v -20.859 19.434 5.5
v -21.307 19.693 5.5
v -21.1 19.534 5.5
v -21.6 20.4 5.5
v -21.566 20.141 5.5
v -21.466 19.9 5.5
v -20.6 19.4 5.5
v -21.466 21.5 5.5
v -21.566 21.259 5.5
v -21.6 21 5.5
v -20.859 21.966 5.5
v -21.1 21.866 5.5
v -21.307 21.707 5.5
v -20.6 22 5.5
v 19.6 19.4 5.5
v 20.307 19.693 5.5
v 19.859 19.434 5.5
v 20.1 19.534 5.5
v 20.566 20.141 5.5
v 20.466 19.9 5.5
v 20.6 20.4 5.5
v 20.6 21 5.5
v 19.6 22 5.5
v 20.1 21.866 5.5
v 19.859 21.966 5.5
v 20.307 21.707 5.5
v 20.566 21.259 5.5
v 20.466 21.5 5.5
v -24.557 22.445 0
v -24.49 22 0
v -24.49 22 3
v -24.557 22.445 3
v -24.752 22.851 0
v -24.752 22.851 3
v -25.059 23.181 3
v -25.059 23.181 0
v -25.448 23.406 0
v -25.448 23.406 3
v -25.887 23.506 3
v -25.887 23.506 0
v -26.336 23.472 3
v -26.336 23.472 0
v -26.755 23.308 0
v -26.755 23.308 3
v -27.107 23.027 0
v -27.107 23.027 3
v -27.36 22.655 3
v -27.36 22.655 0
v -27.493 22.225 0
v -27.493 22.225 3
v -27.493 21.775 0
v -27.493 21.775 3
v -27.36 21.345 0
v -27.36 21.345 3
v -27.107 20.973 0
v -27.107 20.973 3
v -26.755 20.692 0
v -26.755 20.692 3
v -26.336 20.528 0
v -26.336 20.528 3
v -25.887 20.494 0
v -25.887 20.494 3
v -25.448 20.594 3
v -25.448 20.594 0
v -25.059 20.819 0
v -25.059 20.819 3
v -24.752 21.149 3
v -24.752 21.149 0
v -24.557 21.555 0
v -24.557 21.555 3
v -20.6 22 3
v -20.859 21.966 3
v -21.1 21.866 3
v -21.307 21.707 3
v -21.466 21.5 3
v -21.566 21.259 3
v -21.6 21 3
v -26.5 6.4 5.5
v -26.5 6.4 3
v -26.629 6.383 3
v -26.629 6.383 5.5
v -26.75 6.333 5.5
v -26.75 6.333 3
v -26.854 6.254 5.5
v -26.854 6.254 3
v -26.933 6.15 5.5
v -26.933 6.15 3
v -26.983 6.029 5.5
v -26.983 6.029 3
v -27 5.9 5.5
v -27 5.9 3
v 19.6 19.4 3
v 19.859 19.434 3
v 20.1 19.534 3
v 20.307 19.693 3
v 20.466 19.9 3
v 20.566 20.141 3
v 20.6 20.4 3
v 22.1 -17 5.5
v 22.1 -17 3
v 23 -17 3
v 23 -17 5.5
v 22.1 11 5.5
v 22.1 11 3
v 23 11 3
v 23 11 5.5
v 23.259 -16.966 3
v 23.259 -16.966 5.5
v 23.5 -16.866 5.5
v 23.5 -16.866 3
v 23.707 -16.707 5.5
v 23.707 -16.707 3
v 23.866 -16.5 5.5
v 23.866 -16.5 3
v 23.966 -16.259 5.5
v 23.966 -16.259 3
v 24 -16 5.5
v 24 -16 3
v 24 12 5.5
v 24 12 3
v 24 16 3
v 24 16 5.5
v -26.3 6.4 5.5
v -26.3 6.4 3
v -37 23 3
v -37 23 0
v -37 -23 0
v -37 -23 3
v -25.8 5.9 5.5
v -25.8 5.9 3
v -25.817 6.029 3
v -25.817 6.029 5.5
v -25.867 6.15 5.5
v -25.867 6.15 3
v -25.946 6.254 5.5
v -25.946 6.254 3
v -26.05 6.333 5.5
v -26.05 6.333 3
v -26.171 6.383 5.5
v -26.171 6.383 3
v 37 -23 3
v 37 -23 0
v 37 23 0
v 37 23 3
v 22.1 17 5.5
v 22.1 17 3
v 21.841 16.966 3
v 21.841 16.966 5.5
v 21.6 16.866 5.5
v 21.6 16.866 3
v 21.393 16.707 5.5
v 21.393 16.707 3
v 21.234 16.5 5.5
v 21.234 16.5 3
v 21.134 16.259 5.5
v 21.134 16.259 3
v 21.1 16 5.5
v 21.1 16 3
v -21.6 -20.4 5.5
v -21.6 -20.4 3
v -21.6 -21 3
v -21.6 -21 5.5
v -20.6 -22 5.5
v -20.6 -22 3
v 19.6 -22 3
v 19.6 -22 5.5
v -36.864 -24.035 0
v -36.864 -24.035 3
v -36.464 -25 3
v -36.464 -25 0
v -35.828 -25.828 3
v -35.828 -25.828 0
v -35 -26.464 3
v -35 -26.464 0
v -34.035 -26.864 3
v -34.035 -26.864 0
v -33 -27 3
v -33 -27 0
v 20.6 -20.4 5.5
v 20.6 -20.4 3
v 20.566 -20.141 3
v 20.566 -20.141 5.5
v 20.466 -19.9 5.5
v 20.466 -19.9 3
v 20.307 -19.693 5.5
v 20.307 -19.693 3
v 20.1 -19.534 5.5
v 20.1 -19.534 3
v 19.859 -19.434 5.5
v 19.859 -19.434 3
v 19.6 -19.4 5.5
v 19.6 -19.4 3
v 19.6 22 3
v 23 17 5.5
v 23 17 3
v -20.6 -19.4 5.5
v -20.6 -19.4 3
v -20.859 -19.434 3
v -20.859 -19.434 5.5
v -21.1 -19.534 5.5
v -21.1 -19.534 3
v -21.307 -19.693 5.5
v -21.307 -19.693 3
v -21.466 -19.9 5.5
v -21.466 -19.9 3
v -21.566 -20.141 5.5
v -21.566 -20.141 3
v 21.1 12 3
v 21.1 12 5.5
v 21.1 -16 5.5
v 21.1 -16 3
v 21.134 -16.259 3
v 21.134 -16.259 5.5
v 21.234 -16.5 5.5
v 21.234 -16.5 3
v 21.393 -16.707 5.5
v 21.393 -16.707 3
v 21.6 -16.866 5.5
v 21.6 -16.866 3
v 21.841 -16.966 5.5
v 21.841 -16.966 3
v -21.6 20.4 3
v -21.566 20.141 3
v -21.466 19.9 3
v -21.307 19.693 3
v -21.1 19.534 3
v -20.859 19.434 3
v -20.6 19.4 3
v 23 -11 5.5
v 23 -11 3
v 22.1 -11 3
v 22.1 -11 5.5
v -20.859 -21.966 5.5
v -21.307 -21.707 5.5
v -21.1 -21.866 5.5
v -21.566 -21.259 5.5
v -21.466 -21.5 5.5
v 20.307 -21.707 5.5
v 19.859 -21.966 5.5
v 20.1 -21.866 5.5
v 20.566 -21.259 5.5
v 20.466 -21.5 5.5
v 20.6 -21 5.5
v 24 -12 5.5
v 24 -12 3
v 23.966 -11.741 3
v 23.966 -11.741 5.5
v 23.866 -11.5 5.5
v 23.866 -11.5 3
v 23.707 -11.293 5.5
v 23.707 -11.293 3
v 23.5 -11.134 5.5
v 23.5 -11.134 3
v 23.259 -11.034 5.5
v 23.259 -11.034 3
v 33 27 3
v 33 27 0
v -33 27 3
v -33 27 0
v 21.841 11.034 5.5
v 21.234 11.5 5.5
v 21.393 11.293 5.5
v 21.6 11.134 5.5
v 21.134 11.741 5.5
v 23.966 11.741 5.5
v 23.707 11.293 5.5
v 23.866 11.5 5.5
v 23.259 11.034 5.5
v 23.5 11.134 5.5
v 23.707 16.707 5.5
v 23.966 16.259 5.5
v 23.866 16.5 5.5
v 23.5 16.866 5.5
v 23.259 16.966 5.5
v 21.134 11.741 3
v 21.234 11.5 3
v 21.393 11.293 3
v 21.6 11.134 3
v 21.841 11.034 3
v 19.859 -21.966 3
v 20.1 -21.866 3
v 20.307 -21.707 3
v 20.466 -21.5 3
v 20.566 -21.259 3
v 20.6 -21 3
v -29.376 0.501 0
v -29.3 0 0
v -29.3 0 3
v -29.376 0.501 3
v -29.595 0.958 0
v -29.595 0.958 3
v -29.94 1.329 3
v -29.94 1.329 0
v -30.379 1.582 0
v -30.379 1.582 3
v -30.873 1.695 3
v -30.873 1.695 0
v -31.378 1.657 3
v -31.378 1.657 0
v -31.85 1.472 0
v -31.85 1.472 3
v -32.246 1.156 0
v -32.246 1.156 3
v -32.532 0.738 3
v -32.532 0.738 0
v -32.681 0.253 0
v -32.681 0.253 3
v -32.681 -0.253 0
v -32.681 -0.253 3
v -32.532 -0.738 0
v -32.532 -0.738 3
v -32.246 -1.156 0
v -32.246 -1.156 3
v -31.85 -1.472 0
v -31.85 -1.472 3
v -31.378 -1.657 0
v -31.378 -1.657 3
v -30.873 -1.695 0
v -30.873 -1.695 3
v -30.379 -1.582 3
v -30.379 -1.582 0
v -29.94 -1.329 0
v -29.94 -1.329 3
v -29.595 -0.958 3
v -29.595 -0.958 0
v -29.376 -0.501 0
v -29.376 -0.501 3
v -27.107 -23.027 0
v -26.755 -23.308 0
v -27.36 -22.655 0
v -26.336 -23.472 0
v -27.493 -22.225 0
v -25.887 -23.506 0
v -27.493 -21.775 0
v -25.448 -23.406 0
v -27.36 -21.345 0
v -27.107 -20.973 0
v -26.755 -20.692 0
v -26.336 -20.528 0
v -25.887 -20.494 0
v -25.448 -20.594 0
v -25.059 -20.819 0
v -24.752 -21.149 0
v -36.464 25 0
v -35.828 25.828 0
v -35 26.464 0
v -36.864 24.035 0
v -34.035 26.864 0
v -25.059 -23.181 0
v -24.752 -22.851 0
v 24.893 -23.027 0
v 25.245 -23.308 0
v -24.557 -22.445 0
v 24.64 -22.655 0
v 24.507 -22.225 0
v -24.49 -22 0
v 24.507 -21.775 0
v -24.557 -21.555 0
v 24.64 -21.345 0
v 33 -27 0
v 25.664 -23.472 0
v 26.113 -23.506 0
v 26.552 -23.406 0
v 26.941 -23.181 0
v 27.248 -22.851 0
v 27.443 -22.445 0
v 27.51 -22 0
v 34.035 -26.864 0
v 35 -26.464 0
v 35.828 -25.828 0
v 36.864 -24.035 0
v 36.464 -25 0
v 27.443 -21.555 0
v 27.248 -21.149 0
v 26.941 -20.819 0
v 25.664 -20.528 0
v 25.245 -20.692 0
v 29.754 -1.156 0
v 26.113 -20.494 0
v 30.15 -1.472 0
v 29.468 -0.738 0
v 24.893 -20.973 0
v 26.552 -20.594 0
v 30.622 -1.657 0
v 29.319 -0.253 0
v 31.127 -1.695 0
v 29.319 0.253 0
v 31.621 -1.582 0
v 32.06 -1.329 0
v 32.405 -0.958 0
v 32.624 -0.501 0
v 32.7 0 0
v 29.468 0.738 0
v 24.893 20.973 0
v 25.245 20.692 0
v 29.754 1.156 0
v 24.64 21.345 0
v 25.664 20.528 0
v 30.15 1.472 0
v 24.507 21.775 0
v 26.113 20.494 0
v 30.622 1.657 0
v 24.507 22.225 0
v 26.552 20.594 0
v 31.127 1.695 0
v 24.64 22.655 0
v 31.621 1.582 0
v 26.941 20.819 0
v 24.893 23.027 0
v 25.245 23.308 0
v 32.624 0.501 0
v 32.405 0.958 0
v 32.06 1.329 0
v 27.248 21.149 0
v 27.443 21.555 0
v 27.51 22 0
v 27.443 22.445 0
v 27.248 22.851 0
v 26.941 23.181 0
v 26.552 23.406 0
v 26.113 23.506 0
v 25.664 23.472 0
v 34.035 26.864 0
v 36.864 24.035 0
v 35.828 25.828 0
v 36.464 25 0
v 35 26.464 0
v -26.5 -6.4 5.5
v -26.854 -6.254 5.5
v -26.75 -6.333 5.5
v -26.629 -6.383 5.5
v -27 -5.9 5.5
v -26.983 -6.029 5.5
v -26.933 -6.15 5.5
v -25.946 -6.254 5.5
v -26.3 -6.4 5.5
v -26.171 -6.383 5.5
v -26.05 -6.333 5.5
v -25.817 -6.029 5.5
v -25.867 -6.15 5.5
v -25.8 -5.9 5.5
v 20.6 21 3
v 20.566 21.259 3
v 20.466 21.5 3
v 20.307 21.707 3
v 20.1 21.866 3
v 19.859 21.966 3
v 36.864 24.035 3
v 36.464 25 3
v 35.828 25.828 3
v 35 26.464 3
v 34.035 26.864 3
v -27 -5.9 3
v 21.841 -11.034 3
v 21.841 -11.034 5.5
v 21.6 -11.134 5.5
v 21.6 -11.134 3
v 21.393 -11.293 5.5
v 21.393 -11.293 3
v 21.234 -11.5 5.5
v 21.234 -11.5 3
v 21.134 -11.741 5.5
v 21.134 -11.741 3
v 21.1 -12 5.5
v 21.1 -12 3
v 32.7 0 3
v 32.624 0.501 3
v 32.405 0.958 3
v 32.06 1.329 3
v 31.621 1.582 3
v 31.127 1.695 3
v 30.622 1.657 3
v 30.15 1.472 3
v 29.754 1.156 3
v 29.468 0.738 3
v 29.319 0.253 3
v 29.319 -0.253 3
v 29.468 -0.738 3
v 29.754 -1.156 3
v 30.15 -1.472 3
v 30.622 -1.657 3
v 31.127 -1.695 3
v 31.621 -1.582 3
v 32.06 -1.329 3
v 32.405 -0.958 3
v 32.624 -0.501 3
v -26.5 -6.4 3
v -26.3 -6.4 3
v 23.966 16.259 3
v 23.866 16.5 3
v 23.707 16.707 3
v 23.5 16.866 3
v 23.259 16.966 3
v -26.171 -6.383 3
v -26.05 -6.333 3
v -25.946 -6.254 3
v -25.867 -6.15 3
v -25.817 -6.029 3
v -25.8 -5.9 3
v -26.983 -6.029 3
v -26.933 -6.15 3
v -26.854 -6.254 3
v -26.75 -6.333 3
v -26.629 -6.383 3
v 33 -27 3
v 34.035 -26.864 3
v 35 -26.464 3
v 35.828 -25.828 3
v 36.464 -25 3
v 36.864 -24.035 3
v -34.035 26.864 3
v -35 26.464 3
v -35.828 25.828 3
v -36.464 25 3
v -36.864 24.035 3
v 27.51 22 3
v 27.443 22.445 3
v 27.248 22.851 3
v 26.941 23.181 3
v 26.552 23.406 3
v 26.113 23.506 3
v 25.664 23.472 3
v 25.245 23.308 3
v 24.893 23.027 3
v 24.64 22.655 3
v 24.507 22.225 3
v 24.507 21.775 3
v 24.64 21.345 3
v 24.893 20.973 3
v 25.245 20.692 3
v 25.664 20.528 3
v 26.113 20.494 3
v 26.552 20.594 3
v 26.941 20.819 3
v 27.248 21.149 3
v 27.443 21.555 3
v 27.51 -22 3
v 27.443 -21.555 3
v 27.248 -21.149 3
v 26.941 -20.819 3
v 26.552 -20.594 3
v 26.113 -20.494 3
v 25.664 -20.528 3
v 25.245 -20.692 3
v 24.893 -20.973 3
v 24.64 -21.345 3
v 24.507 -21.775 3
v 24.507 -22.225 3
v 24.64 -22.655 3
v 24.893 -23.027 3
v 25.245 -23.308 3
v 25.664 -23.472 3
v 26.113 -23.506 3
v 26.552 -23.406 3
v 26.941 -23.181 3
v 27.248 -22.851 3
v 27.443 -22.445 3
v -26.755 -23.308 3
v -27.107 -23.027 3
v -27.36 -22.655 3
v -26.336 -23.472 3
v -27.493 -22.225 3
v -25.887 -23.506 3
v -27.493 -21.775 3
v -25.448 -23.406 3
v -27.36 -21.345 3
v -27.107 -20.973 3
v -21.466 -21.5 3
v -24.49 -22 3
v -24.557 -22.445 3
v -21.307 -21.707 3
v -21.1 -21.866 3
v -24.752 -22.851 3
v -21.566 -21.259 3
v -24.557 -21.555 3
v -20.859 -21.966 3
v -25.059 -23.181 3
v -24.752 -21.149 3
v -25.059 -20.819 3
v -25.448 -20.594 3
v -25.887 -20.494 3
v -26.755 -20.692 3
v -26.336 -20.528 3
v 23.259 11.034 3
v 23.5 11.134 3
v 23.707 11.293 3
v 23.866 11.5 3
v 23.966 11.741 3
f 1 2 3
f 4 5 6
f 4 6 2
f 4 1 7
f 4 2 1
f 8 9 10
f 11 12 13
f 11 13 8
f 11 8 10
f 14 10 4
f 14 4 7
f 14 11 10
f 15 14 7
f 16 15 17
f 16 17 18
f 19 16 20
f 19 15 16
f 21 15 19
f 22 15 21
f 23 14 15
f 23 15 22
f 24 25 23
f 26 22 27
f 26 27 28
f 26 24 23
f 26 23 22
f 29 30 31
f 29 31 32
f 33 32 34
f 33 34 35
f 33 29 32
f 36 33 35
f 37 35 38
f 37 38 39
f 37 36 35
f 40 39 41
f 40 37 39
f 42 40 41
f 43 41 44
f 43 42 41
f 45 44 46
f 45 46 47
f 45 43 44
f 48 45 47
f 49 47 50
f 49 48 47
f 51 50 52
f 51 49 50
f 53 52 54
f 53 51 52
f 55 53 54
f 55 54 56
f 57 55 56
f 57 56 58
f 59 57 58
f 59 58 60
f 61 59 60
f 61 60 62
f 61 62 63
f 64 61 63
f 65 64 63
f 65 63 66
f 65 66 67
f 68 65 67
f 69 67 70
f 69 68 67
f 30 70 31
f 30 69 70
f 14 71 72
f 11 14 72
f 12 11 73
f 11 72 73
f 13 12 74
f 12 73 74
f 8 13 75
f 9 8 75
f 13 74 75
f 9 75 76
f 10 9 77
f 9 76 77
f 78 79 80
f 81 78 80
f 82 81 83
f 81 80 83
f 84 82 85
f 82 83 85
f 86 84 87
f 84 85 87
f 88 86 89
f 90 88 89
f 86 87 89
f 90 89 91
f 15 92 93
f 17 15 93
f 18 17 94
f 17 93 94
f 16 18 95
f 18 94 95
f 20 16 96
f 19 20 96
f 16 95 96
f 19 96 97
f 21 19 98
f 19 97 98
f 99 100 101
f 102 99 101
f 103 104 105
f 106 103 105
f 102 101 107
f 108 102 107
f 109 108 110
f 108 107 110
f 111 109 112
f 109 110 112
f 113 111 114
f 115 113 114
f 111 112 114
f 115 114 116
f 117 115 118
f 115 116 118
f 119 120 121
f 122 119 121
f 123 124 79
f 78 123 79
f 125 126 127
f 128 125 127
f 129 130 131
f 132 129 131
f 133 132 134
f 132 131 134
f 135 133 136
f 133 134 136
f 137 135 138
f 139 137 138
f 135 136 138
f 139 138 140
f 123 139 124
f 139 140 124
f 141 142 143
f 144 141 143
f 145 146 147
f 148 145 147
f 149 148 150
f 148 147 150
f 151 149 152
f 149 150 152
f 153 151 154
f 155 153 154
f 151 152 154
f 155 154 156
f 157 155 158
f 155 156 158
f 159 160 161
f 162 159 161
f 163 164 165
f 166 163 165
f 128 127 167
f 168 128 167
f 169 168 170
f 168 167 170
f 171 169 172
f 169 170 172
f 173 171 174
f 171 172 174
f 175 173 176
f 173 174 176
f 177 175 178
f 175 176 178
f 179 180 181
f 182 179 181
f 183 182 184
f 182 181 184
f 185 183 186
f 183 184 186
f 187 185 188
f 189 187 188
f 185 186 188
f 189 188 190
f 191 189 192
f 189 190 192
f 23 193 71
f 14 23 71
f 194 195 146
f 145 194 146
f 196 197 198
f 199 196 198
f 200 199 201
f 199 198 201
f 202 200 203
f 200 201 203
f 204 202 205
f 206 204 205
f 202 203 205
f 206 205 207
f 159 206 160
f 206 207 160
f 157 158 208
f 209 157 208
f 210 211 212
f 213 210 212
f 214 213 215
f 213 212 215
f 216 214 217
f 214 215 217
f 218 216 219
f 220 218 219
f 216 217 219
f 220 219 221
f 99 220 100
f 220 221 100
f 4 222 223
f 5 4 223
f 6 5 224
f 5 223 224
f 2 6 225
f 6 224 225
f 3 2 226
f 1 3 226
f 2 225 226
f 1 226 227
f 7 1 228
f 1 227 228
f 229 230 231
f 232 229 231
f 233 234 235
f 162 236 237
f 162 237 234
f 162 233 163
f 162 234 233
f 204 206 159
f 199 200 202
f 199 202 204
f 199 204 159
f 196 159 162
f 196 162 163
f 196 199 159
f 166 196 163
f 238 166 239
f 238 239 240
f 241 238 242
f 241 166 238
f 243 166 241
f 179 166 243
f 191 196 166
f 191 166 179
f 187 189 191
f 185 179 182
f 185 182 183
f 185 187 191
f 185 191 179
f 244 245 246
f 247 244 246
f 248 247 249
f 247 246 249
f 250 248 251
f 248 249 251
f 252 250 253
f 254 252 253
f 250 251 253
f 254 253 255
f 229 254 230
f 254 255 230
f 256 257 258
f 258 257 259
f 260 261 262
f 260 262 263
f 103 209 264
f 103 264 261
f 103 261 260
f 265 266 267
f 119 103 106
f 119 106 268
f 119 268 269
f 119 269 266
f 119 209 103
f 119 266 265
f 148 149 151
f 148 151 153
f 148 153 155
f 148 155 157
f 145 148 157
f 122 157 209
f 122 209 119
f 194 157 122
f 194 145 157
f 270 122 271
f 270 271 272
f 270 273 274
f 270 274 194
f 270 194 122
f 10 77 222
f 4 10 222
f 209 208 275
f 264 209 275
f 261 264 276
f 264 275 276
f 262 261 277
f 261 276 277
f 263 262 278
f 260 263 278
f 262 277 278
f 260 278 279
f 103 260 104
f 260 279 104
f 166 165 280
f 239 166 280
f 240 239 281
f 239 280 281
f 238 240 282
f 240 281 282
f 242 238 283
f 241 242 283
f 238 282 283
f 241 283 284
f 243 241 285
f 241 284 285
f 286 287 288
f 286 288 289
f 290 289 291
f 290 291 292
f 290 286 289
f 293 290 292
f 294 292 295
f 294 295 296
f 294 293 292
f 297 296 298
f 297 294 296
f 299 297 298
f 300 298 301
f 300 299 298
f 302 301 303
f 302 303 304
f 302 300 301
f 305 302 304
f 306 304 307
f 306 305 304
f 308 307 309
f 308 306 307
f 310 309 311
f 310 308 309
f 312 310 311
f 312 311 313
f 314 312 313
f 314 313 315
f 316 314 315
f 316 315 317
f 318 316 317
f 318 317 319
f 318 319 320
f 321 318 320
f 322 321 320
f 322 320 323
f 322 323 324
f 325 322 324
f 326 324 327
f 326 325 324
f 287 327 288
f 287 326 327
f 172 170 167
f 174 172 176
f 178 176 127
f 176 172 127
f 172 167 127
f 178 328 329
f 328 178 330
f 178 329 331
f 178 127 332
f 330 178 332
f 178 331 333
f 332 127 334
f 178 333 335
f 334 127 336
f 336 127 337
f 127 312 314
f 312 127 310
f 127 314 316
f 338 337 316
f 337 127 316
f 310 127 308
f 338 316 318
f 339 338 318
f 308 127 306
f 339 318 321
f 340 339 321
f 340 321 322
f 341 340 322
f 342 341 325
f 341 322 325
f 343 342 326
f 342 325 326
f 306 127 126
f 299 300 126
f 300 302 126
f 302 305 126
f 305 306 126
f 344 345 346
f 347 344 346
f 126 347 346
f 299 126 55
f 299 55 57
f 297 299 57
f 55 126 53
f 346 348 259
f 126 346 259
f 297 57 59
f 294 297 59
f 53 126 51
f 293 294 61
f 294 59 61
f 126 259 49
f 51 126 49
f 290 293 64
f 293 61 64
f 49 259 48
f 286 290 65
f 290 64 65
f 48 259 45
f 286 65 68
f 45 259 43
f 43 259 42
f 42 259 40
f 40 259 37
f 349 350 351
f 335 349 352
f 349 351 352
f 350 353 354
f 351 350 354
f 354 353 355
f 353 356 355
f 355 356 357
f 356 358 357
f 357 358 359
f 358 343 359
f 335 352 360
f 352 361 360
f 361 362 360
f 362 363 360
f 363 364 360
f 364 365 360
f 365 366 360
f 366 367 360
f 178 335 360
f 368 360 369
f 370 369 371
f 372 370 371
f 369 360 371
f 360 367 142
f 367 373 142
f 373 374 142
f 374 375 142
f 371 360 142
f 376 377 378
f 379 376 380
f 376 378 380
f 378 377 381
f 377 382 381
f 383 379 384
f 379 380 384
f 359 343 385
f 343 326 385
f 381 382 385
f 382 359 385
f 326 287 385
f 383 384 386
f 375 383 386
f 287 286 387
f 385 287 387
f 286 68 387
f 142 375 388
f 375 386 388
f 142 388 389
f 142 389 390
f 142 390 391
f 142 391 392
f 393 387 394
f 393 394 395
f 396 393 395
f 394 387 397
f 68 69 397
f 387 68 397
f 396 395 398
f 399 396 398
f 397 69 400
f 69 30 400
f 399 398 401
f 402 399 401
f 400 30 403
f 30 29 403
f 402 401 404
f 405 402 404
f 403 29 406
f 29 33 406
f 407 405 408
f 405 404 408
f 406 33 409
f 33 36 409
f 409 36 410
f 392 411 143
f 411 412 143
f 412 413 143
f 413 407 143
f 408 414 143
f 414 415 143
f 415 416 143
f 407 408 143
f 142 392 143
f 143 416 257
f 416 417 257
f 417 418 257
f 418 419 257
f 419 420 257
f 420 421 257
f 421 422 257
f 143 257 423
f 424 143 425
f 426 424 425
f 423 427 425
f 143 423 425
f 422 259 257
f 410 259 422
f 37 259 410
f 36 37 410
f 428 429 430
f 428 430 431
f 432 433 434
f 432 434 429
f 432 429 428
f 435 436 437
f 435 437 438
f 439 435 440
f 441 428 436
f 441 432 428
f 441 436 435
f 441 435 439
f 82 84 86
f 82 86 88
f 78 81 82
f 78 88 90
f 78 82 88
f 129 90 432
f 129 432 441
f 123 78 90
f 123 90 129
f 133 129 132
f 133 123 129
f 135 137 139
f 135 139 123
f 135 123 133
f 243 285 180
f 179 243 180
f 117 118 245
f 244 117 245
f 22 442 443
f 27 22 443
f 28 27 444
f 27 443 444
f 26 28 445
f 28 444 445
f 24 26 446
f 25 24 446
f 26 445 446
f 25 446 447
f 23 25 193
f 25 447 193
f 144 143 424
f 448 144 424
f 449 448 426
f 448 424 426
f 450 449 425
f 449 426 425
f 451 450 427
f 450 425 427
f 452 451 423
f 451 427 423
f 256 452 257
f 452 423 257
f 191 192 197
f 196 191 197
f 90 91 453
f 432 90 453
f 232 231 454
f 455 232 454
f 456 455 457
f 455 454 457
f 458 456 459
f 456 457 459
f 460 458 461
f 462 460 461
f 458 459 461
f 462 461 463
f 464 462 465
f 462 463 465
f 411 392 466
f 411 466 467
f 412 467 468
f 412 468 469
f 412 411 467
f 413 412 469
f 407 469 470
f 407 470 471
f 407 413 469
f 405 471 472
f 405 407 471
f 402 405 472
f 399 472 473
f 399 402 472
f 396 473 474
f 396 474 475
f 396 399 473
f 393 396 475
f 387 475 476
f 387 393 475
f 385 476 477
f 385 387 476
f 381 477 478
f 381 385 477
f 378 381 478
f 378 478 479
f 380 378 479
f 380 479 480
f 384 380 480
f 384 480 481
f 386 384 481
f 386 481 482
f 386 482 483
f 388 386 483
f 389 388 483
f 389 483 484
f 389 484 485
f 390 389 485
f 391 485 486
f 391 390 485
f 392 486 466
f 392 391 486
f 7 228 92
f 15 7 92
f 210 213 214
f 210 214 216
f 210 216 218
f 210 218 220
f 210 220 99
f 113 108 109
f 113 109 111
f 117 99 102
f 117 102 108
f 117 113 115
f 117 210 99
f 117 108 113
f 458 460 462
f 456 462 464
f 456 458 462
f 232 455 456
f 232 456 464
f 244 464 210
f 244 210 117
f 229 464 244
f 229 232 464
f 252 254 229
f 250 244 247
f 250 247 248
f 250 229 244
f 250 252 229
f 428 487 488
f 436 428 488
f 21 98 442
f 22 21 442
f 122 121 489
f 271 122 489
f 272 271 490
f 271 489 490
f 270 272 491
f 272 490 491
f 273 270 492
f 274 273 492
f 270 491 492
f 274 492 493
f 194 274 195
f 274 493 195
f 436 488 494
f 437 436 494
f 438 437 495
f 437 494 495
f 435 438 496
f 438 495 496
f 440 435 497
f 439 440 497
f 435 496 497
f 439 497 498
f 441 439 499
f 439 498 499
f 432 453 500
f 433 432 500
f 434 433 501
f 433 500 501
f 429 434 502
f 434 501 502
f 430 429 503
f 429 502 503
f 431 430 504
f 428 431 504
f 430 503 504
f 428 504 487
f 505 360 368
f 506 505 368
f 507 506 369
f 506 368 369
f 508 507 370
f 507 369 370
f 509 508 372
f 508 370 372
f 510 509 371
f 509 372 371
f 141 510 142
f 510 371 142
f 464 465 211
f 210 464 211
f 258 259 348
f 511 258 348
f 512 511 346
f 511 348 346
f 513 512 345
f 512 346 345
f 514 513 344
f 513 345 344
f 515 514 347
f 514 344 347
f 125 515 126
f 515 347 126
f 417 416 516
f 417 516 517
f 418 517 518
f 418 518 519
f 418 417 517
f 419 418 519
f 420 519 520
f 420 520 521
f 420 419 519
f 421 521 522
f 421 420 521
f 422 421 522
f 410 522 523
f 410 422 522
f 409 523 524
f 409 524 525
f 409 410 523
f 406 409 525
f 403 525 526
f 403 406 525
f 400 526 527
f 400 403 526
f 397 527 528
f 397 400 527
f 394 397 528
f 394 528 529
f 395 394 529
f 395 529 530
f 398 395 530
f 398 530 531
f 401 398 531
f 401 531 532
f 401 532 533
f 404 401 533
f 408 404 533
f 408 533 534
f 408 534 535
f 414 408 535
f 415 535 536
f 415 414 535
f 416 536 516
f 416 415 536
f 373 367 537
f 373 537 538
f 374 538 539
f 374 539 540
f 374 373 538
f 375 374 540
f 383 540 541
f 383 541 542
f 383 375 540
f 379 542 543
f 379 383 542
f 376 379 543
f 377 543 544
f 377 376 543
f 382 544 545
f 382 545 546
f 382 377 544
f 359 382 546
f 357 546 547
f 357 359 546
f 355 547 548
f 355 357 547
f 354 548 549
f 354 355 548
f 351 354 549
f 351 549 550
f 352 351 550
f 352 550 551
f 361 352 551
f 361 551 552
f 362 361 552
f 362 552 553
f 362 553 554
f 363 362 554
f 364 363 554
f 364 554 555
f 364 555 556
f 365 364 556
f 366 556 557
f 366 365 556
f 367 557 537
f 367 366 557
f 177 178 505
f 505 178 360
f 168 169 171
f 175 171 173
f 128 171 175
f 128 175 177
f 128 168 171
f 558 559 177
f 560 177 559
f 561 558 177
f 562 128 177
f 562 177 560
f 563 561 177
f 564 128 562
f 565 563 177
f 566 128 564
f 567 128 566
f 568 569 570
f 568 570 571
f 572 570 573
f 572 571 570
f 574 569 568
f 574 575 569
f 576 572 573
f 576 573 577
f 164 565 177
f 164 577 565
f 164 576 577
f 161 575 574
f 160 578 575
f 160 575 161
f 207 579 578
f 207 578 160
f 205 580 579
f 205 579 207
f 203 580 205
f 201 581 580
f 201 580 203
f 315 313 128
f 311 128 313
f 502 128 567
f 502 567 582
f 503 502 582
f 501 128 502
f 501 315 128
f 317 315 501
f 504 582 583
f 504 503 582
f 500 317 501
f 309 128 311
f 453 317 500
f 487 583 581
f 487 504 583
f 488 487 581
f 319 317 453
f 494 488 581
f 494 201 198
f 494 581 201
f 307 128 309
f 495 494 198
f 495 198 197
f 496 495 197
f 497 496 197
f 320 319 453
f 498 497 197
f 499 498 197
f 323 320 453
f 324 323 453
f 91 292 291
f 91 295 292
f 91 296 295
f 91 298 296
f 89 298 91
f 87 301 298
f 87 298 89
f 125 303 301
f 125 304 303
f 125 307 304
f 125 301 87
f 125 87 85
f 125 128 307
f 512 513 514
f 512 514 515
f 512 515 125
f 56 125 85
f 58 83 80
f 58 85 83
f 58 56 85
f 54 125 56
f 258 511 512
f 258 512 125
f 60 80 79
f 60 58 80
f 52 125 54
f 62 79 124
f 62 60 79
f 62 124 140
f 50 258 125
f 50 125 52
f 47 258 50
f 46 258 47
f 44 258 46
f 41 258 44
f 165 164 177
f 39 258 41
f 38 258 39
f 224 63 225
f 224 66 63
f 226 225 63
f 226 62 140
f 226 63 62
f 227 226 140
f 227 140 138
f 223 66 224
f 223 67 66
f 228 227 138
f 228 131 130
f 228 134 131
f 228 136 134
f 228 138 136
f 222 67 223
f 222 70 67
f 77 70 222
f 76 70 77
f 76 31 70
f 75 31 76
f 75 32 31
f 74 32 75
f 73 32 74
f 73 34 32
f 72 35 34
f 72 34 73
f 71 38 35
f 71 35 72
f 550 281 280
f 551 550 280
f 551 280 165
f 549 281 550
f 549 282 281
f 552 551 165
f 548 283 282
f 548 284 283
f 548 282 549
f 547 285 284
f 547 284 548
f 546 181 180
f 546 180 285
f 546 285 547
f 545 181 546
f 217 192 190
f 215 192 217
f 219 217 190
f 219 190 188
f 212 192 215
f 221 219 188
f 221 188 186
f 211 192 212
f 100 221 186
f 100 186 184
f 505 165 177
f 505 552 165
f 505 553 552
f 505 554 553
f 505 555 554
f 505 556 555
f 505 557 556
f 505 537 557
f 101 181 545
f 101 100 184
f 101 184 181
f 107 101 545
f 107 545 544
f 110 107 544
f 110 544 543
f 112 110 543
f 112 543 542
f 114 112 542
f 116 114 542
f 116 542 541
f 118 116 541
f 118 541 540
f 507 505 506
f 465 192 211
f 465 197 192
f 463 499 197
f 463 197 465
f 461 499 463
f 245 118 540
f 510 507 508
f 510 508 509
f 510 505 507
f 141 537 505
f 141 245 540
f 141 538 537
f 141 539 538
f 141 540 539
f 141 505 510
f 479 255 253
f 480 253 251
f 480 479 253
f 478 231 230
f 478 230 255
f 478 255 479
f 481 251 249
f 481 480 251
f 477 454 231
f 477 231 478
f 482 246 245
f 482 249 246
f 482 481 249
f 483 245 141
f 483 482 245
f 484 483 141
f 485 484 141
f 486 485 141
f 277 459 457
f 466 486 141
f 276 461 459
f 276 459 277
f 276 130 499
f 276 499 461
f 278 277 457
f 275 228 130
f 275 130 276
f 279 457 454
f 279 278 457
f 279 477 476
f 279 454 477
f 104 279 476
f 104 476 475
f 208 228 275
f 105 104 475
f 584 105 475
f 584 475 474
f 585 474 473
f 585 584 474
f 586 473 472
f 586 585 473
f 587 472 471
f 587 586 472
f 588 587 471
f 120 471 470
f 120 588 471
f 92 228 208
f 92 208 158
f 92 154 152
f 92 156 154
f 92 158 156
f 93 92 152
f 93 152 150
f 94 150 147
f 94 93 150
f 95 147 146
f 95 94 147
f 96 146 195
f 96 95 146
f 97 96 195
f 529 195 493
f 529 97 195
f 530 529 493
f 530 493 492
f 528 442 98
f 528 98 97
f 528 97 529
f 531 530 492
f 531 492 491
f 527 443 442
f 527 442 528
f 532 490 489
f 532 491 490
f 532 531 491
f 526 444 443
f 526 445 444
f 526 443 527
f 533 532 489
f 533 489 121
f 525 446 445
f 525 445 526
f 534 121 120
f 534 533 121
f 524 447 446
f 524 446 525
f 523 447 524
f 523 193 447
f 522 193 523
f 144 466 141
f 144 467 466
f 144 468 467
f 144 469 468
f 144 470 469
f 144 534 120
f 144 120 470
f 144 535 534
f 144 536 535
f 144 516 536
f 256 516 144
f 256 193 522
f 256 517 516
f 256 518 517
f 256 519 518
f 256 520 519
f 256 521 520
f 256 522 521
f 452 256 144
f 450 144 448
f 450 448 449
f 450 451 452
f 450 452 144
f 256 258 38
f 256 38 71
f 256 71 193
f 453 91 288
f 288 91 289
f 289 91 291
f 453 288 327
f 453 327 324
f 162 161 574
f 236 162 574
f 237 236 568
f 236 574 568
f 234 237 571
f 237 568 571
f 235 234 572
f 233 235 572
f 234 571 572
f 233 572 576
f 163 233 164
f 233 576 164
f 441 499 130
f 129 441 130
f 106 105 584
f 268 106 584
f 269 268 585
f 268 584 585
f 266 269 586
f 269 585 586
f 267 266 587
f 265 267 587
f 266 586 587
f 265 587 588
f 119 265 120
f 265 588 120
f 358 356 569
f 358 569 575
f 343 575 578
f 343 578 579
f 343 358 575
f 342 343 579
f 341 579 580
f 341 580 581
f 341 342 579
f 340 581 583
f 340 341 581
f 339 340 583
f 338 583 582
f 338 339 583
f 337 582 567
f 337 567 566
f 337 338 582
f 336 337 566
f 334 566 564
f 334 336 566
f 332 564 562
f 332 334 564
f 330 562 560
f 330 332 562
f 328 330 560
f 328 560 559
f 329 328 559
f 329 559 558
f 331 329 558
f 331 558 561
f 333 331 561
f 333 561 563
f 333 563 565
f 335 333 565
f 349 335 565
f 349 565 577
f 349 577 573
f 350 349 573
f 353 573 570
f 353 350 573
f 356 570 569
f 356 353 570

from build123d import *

# Parameters (mm, degrees)
OUTER_BED_74X54X3_SKETCH_R        = 1.51
OUTER_BED_74X54X3_SKETCH_R_2      = 1.7
OUTER_BED_74X54X3_DEPTH           = 3
FACTORY_CASE_LOCATING_STOPS_START = 3
FACTORY_CASE_LOCATING_STOPS_DEPTH = 2.5


with BuildPart() as part:
    # Outer_bed_74x54x3_Sketch → Outer_bed_74x54x3 (new body)
    with BuildSketch(Plane.XY):
        with BuildLine():
            Line((-33, -27), (33, -27))
            ThreePointArc((33, -27), (35.828427125, -25.828427125), (37, -23))
            Line((37, -23), (37, 23))
            ThreePointArc((37, 23), (35.828427125, 25.828427125), (33, 27))
            Line((33, 27), (-33, 27))
            ThreePointArc((-33, 27), (-35.828427125, 25.828427125), (-37, 23))
            Line((-37, 23), (-37, -23))
            ThreePointArc((-37, -23), (-35.828427125, -25.828427125), (-33, -27))
        make_face()
        with Locations((-26, -22)):
            Circle(OUTER_BED_74X54X3_SKETCH_R, mode=Mode.SUBTRACT)
        with Locations((-26, 22)):
            Circle(OUTER_BED_74X54X3_SKETCH_R, mode=Mode.SUBTRACT)
        with Locations((26, -22)):
            Circle(OUTER_BED_74X54X3_SKETCH_R, mode=Mode.SUBTRACT)
        with Locations((26, 22)):
            Circle(OUTER_BED_74X54X3_SKETCH_R, mode=Mode.SUBTRACT)
        with Locations((-31, 0)):
            Circle(OUTER_BED_74X54X3_SKETCH_R_2, mode=Mode.SUBTRACT)
        with Locations((31, 0)):
            Circle(OUTER_BED_74X54X3_SKETCH_R_2, mode=Mode.SUBTRACT)
    extrude(amount=OUTER_BED_74X54X3_DEPTH)

    # Factory_case_locating_stops_Sketch → Factory_case_locating_stops (add)
    with BuildSketch(Plane.XY.offset(FACTORY_CASE_LOCATING_STOPS_START)):
        with BuildLine():
            Line((-20.6, -22), (19.6, -22))
            ThreePointArc((19.6, -22), (20.307106781, -21.707106781), (20.6, -21))
            Line((20.6, -21), (20.6, -20.4))
            ThreePointArc((20.6, -20.4), (20.307106781, -19.692893219), (19.6, -19.4))
            Line((19.6, -19.4), (-20.6, -19.4))
            ThreePointArc((-20.6, -19.4), (-21.307106781, -19.692893219), (-21.6, -20.4))
            Line((-21.6, -20.4), (-21.6, -21))
            ThreePointArc((-21.6, -21), (-21.307106781, -21.707106781), (-20.6, -22))
        make_face()
        with BuildLine():
            Line((-20.6, 19.4), (19.6, 19.4))
            ThreePointArc((19.6, 19.4), (20.307106781, 19.692893219), (20.6, 20.4))
            Line((20.6, 20.4), (20.6, 21))
            ThreePointArc((20.6, 21), (20.307106781, 21.707106781), (19.6, 22))
            Line((19.6, 22), (-20.6, 22))
            ThreePointArc((-20.6, 22), (-21.307106781, 21.707106781), (-21.6, 21))
            Line((-21.6, 21), (-21.6, 20.4))
            ThreePointArc((-21.6, 20.4), (-21.307106781, 19.692893219), (-20.6, 19.4))
        make_face()
        with BuildLine():
            Line((-26.5, -6.4), (-26.3, -6.4))
            ThreePointArc((-26.3, -6.4), (-25.946446609, -6.253553391), (-25.8, -5.9))
            Line((-25.8, -5.9), (-25.8, 5.9))
            ThreePointArc((-25.8, 5.9), (-25.946446609, 6.253553391), (-26.3, 6.4))
            Line((-26.3, 6.4), (-26.5, 6.4))
            ThreePointArc((-26.5, 6.4), (-26.853553391, 6.253553391), (-27, 5.9))
            Line((-27, 5.9), (-27, -5.9))
            ThreePointArc((-27, -5.9), (-26.853553391, -6.253553391), (-26.5, -6.4))
        make_face()
        with BuildLine():
            Line((22.1, -17), (23, -17))
            ThreePointArc((23, -17), (23.707106781, -16.707106781), (24, -16))
            Line((24, -16), (24, -12))
            ThreePointArc((24, -12), (23.707106781, -11.292893219), (23, -11))
            Line((23, -11), (22.1, -11))
            ThreePointArc((22.1, -11), (21.392893219, -11.292893219), (21.1, -12))
            Line((21.1, -12), (21.1, -16))
            ThreePointArc((21.1, -16), (21.392893219, -16.707106781), (22.1, -17))
        make_face()
        with BuildLine():
            Line((22.1, 11), (23, 11))
            ThreePointArc((23, 11), (23.707106781, 11.292893219), (24, 12))
            Line((24, 12), (24, 16))
            ThreePointArc((24, 16), (23.707106781, 16.707106781), (23, 17))
            Line((23, 17), (22.1, 17))
            ThreePointArc((22.1, 17), (21.392893219, 16.707106781), (21.1, 16))
            Line((21.1, 16), (21.1, 12))
            ThreePointArc((21.1, 12), (21.392893219, 11.292893219), (22.1, 11))
        make_face()
    extrude(amount=FACTORY_CASE_LOCATING_STOPS_DEPTH)


solid = part.part
